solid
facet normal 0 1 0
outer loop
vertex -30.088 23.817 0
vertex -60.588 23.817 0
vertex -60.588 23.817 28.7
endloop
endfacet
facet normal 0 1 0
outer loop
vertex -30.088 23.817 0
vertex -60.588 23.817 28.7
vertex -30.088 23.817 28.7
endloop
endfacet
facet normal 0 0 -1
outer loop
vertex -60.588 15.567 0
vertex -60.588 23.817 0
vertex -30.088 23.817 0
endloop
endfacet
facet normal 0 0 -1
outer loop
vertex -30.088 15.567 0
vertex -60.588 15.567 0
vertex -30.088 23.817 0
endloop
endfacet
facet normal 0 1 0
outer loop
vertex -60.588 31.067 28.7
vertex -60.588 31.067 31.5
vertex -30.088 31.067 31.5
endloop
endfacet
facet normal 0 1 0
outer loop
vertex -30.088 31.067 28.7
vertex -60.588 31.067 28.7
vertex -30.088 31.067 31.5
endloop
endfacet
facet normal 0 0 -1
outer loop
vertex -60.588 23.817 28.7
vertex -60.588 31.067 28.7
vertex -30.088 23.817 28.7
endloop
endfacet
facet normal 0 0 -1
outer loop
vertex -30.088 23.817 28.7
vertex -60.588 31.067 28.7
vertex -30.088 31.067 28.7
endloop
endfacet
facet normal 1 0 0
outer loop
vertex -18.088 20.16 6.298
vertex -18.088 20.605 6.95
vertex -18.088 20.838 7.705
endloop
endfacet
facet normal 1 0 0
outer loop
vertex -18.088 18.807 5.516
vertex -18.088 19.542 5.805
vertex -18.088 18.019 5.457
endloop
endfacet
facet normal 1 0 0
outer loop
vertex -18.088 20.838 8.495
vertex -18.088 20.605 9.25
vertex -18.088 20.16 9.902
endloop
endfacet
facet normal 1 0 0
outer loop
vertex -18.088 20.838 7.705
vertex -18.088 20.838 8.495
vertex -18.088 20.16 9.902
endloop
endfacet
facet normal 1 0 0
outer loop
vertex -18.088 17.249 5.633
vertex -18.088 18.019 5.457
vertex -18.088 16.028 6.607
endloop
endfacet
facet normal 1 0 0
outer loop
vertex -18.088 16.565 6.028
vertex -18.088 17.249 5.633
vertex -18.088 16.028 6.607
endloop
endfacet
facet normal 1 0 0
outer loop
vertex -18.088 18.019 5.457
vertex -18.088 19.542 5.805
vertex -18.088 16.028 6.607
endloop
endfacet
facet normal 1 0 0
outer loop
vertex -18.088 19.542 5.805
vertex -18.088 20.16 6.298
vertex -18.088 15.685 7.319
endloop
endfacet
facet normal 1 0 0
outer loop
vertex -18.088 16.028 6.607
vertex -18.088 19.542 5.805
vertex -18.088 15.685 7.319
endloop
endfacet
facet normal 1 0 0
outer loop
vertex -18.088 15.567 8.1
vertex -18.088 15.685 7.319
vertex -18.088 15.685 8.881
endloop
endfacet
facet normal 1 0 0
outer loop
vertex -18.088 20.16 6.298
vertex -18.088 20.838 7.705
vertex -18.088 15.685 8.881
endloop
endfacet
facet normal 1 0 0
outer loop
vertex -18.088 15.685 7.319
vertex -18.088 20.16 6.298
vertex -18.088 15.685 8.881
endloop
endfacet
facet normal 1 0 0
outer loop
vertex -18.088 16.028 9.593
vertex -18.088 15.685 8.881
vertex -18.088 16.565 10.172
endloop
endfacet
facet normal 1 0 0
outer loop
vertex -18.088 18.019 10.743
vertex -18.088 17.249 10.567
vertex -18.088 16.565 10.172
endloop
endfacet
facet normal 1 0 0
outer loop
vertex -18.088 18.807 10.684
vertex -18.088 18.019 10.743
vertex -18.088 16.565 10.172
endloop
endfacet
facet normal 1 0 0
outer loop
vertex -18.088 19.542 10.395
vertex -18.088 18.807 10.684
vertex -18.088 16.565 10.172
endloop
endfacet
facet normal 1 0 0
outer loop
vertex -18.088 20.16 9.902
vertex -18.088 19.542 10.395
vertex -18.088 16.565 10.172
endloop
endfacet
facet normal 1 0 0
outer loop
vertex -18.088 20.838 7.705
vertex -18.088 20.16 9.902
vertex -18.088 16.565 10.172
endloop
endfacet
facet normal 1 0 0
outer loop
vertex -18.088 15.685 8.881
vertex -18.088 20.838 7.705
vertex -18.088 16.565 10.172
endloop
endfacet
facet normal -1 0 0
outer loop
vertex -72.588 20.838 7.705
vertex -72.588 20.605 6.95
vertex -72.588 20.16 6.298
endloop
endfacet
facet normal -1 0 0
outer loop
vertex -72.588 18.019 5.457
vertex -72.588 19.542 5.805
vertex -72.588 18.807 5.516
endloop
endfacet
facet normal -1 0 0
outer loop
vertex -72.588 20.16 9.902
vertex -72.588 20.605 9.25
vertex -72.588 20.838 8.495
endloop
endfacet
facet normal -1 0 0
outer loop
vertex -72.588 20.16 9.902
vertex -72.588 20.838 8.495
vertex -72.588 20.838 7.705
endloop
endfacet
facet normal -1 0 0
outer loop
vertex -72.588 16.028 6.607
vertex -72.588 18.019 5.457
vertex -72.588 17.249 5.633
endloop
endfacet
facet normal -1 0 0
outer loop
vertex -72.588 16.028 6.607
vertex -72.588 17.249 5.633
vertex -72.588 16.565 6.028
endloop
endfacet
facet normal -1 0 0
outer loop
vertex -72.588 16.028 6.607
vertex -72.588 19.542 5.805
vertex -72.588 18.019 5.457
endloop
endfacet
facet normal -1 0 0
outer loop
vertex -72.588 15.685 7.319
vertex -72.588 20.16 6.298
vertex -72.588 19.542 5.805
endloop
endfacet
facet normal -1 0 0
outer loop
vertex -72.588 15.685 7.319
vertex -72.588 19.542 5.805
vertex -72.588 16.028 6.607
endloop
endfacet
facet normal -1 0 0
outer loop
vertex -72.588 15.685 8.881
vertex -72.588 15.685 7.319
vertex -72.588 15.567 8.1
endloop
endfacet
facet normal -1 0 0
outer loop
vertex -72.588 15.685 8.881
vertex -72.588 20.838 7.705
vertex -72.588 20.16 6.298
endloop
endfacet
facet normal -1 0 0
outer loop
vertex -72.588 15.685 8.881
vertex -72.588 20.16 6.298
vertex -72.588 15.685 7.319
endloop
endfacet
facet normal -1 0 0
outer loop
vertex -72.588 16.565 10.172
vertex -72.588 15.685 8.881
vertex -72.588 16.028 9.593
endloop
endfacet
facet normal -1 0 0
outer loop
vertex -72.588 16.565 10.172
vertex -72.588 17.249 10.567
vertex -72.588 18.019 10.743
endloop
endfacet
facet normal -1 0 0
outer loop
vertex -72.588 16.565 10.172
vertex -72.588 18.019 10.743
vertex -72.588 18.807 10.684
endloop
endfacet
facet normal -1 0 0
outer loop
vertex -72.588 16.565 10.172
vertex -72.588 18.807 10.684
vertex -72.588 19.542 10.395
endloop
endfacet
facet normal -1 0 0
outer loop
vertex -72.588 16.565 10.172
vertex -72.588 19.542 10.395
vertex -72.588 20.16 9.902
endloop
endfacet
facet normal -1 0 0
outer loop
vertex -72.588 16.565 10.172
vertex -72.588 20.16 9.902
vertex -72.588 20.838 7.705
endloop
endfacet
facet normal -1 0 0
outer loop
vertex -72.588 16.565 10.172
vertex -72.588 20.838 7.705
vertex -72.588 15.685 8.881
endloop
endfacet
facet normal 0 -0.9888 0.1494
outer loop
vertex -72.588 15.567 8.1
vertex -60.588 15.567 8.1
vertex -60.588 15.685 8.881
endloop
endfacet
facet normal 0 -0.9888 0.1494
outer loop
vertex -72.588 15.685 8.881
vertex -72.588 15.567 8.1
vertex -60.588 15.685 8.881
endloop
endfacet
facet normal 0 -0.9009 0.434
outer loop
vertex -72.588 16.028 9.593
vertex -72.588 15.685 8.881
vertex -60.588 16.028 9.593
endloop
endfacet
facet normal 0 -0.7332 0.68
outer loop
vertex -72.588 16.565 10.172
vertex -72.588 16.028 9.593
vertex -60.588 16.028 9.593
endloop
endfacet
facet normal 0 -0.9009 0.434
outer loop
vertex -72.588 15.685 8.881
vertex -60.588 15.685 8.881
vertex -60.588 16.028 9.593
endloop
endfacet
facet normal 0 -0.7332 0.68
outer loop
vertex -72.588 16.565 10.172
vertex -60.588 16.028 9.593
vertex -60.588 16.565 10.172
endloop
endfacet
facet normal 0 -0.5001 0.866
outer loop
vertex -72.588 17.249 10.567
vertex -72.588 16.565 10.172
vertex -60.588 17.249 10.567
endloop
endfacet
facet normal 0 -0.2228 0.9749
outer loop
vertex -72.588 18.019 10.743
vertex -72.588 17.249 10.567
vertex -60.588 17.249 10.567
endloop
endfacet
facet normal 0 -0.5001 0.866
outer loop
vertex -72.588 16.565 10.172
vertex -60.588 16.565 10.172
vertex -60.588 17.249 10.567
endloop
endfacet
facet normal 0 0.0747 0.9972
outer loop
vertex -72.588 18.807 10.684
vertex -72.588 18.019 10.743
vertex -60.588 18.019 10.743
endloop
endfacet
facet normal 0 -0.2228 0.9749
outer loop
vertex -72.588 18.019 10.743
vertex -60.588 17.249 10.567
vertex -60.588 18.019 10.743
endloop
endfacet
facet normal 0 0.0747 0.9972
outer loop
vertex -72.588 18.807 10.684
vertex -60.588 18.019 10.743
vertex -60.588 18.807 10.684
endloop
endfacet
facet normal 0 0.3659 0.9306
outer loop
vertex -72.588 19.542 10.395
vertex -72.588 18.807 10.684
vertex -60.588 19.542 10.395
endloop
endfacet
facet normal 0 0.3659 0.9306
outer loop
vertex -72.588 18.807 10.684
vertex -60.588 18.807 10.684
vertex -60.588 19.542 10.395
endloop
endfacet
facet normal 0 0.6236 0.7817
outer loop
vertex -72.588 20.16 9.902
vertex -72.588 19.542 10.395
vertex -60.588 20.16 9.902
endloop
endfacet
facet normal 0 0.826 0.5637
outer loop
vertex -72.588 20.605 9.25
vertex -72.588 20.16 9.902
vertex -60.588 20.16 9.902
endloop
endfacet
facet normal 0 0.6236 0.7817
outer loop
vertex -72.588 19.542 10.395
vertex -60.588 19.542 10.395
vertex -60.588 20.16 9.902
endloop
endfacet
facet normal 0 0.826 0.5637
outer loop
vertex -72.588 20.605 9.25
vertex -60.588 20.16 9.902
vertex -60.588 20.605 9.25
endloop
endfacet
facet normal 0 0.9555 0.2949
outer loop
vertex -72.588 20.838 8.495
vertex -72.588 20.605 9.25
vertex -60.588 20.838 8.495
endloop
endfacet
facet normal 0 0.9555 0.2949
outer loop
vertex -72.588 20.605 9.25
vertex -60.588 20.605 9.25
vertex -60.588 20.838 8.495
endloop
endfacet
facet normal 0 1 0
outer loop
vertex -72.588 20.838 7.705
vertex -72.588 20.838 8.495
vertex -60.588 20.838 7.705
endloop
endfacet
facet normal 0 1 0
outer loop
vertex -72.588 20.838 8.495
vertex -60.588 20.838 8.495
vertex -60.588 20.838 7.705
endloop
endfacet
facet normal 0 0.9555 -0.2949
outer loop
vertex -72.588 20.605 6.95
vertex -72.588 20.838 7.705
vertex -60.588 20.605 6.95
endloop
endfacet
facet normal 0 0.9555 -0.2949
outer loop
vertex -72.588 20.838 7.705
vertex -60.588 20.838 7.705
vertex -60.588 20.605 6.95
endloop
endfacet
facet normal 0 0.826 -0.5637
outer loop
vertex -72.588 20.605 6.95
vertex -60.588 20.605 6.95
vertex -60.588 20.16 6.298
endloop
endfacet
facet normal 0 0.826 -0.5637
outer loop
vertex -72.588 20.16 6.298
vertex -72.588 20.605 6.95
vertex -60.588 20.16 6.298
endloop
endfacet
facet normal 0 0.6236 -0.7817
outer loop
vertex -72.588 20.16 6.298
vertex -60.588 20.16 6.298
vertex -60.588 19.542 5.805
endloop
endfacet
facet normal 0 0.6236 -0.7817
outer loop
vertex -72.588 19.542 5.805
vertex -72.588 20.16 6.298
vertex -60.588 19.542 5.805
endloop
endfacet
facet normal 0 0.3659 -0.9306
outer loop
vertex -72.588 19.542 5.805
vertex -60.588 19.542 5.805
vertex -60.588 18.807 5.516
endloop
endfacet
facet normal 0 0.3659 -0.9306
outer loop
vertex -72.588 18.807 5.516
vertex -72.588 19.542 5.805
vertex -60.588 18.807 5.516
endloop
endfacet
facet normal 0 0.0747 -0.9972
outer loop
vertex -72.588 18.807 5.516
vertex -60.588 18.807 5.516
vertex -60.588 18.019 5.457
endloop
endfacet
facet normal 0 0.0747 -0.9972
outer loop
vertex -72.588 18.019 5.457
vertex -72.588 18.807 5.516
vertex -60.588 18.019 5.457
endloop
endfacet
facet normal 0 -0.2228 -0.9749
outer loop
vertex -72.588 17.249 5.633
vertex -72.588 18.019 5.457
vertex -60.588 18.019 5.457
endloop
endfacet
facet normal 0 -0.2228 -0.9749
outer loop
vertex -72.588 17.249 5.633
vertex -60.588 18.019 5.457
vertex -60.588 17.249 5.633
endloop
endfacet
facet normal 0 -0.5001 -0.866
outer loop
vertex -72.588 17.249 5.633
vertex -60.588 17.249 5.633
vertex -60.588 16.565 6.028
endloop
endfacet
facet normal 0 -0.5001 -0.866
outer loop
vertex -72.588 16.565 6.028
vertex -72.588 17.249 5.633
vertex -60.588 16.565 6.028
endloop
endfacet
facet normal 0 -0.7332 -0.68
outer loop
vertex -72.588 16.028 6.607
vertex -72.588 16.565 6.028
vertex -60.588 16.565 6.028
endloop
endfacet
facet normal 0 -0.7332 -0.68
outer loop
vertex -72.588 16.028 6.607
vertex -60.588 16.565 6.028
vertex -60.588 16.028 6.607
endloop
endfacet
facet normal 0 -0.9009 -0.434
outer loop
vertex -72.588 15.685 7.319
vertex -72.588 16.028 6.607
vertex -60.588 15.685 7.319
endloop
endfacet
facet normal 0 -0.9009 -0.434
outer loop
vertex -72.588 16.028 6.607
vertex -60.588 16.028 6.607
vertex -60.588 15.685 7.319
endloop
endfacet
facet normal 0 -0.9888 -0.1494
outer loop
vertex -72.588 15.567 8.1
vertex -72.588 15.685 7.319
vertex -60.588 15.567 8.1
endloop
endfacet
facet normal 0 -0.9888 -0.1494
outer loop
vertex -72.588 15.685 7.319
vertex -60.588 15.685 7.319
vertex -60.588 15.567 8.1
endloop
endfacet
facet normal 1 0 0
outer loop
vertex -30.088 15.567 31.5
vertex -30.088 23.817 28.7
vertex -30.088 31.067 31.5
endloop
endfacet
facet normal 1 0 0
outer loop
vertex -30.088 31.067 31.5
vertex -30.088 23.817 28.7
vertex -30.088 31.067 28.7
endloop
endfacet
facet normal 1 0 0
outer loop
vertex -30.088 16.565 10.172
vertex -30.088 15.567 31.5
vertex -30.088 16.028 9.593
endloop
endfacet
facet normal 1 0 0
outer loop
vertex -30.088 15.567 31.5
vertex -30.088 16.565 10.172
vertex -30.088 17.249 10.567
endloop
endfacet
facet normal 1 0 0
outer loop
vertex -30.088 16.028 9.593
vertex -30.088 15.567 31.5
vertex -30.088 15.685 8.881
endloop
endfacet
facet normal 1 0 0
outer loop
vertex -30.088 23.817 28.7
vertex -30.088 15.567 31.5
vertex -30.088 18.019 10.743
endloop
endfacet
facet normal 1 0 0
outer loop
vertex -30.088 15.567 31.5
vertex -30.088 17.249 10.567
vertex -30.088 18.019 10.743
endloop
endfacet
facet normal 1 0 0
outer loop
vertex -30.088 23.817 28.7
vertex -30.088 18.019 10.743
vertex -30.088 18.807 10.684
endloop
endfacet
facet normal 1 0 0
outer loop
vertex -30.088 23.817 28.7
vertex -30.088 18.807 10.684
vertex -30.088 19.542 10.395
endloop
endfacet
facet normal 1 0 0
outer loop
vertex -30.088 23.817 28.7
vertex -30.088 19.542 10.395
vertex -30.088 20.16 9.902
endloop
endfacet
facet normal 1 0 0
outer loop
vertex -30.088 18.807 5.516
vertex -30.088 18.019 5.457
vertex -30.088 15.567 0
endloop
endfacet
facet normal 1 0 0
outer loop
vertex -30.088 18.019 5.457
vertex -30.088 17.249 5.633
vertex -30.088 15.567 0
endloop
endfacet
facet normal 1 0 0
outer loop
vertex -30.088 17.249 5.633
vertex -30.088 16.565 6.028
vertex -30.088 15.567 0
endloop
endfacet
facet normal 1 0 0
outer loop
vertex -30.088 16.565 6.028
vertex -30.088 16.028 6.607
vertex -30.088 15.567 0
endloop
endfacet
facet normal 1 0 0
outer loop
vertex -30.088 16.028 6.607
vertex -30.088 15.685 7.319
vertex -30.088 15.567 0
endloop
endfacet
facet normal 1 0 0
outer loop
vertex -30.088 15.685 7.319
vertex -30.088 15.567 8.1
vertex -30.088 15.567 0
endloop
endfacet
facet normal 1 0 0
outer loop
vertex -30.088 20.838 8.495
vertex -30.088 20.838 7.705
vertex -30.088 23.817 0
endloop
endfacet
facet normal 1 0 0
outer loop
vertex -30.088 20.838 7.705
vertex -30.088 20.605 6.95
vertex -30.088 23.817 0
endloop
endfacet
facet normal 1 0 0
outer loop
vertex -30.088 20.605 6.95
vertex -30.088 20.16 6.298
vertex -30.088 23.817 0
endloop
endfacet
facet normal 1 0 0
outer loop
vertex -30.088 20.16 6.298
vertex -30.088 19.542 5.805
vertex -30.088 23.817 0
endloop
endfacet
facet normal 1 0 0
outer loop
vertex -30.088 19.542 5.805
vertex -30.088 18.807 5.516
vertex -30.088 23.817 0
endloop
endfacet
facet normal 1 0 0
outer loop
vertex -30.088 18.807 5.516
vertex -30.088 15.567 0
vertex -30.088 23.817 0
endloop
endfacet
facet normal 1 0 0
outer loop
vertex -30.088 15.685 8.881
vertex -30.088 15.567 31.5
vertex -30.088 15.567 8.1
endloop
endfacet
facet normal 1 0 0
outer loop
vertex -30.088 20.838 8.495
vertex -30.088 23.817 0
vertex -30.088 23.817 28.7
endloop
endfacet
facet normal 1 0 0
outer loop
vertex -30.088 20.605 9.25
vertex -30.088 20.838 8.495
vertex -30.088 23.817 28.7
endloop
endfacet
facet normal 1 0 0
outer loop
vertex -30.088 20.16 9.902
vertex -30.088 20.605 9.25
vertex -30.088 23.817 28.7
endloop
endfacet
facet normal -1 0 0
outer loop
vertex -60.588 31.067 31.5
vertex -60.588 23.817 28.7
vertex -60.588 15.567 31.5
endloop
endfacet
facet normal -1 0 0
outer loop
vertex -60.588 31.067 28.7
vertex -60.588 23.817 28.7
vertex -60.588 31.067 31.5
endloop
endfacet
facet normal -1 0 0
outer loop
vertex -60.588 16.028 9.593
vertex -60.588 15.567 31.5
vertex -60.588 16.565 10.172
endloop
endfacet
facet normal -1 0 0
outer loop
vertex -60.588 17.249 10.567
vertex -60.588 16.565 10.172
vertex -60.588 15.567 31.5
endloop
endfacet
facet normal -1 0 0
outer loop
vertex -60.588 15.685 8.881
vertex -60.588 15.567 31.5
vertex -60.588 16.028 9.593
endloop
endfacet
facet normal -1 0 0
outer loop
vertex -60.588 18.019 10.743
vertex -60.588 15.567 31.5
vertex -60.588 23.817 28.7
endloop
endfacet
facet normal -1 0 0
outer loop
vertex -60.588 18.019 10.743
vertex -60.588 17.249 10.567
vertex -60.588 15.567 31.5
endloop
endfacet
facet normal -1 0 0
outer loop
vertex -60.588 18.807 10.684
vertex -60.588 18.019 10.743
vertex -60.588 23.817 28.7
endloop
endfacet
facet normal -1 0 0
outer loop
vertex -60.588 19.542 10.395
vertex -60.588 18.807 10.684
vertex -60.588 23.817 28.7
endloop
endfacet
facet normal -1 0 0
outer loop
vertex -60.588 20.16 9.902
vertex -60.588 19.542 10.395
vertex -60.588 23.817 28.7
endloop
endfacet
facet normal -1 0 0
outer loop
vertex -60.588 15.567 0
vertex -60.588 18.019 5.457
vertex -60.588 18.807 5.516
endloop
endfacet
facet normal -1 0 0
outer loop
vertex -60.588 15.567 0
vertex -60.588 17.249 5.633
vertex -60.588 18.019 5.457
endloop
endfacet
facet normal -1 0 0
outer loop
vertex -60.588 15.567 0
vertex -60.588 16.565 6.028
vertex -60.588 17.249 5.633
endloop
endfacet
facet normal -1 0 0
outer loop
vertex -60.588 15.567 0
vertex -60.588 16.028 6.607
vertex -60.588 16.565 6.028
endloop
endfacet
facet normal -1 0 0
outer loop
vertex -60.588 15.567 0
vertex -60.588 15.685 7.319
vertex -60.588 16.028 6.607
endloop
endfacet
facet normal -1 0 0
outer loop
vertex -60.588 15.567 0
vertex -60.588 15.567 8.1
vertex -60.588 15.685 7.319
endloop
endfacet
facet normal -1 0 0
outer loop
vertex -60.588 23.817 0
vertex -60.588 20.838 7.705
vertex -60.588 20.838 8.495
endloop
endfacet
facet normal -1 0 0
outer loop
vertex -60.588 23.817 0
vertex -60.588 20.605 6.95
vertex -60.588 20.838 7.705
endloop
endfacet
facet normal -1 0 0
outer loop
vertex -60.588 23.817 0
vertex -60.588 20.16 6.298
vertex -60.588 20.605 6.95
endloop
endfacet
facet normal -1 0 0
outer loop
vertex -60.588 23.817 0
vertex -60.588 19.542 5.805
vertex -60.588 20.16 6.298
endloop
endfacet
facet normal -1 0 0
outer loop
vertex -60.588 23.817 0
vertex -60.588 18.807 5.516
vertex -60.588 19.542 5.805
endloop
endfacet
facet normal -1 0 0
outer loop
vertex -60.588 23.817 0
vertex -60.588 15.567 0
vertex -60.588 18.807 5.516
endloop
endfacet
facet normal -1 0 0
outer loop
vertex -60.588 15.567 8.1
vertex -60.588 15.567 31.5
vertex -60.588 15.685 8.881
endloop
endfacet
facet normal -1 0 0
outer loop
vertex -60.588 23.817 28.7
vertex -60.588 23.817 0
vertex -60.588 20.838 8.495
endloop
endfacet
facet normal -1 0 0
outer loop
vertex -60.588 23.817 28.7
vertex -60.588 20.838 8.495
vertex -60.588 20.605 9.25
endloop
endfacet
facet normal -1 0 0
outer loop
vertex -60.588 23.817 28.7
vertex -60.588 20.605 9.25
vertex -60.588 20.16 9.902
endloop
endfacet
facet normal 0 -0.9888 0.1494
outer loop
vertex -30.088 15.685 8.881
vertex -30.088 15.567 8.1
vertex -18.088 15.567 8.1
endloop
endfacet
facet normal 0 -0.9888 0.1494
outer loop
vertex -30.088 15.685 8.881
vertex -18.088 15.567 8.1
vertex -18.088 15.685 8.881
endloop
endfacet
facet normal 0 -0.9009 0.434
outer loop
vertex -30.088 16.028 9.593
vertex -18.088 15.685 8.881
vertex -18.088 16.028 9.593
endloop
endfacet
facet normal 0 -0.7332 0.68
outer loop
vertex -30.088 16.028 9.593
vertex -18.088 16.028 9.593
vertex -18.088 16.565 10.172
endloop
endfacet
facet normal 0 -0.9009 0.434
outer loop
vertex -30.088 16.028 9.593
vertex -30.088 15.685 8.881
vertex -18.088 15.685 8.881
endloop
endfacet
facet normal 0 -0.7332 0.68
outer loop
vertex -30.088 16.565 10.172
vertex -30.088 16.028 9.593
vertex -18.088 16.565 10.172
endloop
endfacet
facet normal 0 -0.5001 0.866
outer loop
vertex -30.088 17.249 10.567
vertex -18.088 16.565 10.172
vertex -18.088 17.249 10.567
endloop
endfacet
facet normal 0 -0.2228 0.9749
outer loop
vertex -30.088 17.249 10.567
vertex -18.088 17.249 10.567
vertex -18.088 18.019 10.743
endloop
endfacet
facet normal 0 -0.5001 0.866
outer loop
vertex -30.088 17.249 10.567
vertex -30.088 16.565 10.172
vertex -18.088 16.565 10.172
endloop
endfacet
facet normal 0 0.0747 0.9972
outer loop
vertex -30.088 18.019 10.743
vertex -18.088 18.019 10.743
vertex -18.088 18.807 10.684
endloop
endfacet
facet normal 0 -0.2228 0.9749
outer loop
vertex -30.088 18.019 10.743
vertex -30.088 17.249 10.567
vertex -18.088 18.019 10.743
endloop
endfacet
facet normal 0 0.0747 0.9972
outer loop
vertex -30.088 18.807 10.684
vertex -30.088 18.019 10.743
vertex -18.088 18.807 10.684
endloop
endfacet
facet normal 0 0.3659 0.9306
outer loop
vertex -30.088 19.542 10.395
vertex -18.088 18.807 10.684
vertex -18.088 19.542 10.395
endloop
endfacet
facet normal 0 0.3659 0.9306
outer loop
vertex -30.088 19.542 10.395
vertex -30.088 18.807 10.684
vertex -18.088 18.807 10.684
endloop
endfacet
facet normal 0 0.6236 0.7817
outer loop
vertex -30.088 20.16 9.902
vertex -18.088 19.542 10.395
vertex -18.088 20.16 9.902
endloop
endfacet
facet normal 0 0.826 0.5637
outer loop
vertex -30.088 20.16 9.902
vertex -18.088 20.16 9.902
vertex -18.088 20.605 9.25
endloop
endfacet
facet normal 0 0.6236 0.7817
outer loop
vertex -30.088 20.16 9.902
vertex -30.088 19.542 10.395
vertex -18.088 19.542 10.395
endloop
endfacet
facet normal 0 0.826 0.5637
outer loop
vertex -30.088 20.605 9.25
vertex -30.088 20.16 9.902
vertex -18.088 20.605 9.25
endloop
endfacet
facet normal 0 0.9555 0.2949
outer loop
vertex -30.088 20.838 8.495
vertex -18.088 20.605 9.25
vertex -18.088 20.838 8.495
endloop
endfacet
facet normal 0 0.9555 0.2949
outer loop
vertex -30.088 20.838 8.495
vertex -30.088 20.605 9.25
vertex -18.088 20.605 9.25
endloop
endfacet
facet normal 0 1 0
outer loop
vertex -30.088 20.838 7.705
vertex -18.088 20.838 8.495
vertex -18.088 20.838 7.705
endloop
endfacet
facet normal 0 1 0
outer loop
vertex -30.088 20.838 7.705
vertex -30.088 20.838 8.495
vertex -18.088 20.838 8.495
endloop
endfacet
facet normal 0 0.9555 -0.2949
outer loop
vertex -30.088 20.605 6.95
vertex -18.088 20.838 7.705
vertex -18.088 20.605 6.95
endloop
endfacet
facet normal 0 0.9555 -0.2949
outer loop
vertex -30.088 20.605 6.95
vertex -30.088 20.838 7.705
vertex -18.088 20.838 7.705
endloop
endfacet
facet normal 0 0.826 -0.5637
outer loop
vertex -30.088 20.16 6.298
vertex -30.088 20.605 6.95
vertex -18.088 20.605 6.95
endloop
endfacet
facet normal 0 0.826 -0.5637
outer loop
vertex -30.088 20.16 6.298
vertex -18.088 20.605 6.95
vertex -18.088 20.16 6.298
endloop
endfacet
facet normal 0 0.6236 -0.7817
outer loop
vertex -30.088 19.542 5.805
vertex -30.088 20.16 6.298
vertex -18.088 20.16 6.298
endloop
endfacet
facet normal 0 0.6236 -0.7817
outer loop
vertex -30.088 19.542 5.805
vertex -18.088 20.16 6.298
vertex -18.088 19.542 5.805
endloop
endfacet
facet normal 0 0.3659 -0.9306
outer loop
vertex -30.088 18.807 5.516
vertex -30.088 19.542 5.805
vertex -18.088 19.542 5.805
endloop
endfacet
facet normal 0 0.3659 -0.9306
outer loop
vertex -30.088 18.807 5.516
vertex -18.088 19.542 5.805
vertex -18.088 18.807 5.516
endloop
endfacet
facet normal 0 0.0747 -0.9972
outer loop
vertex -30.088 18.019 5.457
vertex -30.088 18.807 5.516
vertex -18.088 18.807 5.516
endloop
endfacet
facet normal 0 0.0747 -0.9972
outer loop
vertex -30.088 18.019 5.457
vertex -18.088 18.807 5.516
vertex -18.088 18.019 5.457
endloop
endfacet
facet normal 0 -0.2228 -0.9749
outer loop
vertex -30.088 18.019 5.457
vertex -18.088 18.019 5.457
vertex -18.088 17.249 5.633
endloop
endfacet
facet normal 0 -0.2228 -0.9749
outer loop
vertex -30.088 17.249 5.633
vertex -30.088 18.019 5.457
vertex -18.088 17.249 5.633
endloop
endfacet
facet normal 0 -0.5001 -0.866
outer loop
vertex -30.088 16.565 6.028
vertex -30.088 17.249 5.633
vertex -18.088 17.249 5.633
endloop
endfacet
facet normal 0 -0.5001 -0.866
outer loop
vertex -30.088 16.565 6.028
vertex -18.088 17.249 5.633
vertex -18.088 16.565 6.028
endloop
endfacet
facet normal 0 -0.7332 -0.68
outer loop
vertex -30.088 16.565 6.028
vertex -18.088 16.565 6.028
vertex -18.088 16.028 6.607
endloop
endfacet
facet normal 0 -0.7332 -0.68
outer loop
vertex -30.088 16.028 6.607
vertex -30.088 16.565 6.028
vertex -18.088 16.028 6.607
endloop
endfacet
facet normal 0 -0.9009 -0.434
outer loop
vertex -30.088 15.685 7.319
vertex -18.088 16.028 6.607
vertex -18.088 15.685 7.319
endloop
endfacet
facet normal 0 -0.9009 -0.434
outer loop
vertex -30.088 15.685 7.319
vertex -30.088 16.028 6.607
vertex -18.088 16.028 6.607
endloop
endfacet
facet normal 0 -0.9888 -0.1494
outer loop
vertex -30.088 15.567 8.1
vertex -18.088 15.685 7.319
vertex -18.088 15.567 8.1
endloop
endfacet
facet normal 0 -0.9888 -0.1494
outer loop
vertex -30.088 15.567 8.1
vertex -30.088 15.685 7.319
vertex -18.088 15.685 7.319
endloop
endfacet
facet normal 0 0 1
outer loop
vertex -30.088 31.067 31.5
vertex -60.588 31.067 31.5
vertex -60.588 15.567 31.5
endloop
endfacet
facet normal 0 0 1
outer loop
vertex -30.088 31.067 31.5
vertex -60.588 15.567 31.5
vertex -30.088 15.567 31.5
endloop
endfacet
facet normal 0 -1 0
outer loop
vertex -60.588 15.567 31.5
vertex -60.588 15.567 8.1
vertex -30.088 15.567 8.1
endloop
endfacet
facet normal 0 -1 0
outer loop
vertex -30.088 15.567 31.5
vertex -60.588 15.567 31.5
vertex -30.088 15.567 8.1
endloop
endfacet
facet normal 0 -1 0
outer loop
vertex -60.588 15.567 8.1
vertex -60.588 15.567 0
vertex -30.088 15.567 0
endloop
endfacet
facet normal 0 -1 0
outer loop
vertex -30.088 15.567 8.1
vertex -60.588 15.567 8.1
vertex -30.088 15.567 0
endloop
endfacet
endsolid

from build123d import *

# Parameters (mm, degrees)
ESQUISSE2_W          = 30.5
ESQUISSE2_H          = 8.25
BASE_EXTRUSION_DEPTH = 31.5
ESQUISSE3_W          = 30.5
ESQUISSE3_H          = 15.5
BOSS_EXTRU_2_DEPTH   = 2.8
ESQUISSE4_R          = 2.65
BOSS_EXTRU_3_DEPTH   = 12


with BuildPart() as part:
    # Esquisse2 → Base-Extrusion (new body)
    with BuildSketch(Plane.XY):
        with Locations((-45.33773679, 19.692248255)):
            Rectangle(ESQUISSE2_W, ESQUISSE2_H)
    extrude(amount=BASE_EXTRUSION_DEPTH)

    # Esquisse3 → Boss.-Extru.2 (add)
    with BuildSketch(Plane.XY.offset(31.5)):
        with Locations((-45.33773679, 23.317248255)):
            Rectangle(ESQUISSE3_W, ESQUISSE3_H)
    extrude(amount=-BOSS_EXTRU_2_DEPTH)

    # Esquisse4 → Boss.-Extru.3 (add)
    with BuildSketch(Plane.ZY.offset(60.58773679)):
        with Locations(Location((8.1, 18.217248255, 0), (0, 0, 270))):
            Circle(ESQUISSE4_R)
    boss_extru_3 = extrude(amount=BOSS_EXTRU_3_DEPTH)

    # Symétrie1: Boss.-Extru.3 across plane
    add(boss_extru_3.mirror(Plane.ZY.offset(45.33773679)))


solid = part.part
